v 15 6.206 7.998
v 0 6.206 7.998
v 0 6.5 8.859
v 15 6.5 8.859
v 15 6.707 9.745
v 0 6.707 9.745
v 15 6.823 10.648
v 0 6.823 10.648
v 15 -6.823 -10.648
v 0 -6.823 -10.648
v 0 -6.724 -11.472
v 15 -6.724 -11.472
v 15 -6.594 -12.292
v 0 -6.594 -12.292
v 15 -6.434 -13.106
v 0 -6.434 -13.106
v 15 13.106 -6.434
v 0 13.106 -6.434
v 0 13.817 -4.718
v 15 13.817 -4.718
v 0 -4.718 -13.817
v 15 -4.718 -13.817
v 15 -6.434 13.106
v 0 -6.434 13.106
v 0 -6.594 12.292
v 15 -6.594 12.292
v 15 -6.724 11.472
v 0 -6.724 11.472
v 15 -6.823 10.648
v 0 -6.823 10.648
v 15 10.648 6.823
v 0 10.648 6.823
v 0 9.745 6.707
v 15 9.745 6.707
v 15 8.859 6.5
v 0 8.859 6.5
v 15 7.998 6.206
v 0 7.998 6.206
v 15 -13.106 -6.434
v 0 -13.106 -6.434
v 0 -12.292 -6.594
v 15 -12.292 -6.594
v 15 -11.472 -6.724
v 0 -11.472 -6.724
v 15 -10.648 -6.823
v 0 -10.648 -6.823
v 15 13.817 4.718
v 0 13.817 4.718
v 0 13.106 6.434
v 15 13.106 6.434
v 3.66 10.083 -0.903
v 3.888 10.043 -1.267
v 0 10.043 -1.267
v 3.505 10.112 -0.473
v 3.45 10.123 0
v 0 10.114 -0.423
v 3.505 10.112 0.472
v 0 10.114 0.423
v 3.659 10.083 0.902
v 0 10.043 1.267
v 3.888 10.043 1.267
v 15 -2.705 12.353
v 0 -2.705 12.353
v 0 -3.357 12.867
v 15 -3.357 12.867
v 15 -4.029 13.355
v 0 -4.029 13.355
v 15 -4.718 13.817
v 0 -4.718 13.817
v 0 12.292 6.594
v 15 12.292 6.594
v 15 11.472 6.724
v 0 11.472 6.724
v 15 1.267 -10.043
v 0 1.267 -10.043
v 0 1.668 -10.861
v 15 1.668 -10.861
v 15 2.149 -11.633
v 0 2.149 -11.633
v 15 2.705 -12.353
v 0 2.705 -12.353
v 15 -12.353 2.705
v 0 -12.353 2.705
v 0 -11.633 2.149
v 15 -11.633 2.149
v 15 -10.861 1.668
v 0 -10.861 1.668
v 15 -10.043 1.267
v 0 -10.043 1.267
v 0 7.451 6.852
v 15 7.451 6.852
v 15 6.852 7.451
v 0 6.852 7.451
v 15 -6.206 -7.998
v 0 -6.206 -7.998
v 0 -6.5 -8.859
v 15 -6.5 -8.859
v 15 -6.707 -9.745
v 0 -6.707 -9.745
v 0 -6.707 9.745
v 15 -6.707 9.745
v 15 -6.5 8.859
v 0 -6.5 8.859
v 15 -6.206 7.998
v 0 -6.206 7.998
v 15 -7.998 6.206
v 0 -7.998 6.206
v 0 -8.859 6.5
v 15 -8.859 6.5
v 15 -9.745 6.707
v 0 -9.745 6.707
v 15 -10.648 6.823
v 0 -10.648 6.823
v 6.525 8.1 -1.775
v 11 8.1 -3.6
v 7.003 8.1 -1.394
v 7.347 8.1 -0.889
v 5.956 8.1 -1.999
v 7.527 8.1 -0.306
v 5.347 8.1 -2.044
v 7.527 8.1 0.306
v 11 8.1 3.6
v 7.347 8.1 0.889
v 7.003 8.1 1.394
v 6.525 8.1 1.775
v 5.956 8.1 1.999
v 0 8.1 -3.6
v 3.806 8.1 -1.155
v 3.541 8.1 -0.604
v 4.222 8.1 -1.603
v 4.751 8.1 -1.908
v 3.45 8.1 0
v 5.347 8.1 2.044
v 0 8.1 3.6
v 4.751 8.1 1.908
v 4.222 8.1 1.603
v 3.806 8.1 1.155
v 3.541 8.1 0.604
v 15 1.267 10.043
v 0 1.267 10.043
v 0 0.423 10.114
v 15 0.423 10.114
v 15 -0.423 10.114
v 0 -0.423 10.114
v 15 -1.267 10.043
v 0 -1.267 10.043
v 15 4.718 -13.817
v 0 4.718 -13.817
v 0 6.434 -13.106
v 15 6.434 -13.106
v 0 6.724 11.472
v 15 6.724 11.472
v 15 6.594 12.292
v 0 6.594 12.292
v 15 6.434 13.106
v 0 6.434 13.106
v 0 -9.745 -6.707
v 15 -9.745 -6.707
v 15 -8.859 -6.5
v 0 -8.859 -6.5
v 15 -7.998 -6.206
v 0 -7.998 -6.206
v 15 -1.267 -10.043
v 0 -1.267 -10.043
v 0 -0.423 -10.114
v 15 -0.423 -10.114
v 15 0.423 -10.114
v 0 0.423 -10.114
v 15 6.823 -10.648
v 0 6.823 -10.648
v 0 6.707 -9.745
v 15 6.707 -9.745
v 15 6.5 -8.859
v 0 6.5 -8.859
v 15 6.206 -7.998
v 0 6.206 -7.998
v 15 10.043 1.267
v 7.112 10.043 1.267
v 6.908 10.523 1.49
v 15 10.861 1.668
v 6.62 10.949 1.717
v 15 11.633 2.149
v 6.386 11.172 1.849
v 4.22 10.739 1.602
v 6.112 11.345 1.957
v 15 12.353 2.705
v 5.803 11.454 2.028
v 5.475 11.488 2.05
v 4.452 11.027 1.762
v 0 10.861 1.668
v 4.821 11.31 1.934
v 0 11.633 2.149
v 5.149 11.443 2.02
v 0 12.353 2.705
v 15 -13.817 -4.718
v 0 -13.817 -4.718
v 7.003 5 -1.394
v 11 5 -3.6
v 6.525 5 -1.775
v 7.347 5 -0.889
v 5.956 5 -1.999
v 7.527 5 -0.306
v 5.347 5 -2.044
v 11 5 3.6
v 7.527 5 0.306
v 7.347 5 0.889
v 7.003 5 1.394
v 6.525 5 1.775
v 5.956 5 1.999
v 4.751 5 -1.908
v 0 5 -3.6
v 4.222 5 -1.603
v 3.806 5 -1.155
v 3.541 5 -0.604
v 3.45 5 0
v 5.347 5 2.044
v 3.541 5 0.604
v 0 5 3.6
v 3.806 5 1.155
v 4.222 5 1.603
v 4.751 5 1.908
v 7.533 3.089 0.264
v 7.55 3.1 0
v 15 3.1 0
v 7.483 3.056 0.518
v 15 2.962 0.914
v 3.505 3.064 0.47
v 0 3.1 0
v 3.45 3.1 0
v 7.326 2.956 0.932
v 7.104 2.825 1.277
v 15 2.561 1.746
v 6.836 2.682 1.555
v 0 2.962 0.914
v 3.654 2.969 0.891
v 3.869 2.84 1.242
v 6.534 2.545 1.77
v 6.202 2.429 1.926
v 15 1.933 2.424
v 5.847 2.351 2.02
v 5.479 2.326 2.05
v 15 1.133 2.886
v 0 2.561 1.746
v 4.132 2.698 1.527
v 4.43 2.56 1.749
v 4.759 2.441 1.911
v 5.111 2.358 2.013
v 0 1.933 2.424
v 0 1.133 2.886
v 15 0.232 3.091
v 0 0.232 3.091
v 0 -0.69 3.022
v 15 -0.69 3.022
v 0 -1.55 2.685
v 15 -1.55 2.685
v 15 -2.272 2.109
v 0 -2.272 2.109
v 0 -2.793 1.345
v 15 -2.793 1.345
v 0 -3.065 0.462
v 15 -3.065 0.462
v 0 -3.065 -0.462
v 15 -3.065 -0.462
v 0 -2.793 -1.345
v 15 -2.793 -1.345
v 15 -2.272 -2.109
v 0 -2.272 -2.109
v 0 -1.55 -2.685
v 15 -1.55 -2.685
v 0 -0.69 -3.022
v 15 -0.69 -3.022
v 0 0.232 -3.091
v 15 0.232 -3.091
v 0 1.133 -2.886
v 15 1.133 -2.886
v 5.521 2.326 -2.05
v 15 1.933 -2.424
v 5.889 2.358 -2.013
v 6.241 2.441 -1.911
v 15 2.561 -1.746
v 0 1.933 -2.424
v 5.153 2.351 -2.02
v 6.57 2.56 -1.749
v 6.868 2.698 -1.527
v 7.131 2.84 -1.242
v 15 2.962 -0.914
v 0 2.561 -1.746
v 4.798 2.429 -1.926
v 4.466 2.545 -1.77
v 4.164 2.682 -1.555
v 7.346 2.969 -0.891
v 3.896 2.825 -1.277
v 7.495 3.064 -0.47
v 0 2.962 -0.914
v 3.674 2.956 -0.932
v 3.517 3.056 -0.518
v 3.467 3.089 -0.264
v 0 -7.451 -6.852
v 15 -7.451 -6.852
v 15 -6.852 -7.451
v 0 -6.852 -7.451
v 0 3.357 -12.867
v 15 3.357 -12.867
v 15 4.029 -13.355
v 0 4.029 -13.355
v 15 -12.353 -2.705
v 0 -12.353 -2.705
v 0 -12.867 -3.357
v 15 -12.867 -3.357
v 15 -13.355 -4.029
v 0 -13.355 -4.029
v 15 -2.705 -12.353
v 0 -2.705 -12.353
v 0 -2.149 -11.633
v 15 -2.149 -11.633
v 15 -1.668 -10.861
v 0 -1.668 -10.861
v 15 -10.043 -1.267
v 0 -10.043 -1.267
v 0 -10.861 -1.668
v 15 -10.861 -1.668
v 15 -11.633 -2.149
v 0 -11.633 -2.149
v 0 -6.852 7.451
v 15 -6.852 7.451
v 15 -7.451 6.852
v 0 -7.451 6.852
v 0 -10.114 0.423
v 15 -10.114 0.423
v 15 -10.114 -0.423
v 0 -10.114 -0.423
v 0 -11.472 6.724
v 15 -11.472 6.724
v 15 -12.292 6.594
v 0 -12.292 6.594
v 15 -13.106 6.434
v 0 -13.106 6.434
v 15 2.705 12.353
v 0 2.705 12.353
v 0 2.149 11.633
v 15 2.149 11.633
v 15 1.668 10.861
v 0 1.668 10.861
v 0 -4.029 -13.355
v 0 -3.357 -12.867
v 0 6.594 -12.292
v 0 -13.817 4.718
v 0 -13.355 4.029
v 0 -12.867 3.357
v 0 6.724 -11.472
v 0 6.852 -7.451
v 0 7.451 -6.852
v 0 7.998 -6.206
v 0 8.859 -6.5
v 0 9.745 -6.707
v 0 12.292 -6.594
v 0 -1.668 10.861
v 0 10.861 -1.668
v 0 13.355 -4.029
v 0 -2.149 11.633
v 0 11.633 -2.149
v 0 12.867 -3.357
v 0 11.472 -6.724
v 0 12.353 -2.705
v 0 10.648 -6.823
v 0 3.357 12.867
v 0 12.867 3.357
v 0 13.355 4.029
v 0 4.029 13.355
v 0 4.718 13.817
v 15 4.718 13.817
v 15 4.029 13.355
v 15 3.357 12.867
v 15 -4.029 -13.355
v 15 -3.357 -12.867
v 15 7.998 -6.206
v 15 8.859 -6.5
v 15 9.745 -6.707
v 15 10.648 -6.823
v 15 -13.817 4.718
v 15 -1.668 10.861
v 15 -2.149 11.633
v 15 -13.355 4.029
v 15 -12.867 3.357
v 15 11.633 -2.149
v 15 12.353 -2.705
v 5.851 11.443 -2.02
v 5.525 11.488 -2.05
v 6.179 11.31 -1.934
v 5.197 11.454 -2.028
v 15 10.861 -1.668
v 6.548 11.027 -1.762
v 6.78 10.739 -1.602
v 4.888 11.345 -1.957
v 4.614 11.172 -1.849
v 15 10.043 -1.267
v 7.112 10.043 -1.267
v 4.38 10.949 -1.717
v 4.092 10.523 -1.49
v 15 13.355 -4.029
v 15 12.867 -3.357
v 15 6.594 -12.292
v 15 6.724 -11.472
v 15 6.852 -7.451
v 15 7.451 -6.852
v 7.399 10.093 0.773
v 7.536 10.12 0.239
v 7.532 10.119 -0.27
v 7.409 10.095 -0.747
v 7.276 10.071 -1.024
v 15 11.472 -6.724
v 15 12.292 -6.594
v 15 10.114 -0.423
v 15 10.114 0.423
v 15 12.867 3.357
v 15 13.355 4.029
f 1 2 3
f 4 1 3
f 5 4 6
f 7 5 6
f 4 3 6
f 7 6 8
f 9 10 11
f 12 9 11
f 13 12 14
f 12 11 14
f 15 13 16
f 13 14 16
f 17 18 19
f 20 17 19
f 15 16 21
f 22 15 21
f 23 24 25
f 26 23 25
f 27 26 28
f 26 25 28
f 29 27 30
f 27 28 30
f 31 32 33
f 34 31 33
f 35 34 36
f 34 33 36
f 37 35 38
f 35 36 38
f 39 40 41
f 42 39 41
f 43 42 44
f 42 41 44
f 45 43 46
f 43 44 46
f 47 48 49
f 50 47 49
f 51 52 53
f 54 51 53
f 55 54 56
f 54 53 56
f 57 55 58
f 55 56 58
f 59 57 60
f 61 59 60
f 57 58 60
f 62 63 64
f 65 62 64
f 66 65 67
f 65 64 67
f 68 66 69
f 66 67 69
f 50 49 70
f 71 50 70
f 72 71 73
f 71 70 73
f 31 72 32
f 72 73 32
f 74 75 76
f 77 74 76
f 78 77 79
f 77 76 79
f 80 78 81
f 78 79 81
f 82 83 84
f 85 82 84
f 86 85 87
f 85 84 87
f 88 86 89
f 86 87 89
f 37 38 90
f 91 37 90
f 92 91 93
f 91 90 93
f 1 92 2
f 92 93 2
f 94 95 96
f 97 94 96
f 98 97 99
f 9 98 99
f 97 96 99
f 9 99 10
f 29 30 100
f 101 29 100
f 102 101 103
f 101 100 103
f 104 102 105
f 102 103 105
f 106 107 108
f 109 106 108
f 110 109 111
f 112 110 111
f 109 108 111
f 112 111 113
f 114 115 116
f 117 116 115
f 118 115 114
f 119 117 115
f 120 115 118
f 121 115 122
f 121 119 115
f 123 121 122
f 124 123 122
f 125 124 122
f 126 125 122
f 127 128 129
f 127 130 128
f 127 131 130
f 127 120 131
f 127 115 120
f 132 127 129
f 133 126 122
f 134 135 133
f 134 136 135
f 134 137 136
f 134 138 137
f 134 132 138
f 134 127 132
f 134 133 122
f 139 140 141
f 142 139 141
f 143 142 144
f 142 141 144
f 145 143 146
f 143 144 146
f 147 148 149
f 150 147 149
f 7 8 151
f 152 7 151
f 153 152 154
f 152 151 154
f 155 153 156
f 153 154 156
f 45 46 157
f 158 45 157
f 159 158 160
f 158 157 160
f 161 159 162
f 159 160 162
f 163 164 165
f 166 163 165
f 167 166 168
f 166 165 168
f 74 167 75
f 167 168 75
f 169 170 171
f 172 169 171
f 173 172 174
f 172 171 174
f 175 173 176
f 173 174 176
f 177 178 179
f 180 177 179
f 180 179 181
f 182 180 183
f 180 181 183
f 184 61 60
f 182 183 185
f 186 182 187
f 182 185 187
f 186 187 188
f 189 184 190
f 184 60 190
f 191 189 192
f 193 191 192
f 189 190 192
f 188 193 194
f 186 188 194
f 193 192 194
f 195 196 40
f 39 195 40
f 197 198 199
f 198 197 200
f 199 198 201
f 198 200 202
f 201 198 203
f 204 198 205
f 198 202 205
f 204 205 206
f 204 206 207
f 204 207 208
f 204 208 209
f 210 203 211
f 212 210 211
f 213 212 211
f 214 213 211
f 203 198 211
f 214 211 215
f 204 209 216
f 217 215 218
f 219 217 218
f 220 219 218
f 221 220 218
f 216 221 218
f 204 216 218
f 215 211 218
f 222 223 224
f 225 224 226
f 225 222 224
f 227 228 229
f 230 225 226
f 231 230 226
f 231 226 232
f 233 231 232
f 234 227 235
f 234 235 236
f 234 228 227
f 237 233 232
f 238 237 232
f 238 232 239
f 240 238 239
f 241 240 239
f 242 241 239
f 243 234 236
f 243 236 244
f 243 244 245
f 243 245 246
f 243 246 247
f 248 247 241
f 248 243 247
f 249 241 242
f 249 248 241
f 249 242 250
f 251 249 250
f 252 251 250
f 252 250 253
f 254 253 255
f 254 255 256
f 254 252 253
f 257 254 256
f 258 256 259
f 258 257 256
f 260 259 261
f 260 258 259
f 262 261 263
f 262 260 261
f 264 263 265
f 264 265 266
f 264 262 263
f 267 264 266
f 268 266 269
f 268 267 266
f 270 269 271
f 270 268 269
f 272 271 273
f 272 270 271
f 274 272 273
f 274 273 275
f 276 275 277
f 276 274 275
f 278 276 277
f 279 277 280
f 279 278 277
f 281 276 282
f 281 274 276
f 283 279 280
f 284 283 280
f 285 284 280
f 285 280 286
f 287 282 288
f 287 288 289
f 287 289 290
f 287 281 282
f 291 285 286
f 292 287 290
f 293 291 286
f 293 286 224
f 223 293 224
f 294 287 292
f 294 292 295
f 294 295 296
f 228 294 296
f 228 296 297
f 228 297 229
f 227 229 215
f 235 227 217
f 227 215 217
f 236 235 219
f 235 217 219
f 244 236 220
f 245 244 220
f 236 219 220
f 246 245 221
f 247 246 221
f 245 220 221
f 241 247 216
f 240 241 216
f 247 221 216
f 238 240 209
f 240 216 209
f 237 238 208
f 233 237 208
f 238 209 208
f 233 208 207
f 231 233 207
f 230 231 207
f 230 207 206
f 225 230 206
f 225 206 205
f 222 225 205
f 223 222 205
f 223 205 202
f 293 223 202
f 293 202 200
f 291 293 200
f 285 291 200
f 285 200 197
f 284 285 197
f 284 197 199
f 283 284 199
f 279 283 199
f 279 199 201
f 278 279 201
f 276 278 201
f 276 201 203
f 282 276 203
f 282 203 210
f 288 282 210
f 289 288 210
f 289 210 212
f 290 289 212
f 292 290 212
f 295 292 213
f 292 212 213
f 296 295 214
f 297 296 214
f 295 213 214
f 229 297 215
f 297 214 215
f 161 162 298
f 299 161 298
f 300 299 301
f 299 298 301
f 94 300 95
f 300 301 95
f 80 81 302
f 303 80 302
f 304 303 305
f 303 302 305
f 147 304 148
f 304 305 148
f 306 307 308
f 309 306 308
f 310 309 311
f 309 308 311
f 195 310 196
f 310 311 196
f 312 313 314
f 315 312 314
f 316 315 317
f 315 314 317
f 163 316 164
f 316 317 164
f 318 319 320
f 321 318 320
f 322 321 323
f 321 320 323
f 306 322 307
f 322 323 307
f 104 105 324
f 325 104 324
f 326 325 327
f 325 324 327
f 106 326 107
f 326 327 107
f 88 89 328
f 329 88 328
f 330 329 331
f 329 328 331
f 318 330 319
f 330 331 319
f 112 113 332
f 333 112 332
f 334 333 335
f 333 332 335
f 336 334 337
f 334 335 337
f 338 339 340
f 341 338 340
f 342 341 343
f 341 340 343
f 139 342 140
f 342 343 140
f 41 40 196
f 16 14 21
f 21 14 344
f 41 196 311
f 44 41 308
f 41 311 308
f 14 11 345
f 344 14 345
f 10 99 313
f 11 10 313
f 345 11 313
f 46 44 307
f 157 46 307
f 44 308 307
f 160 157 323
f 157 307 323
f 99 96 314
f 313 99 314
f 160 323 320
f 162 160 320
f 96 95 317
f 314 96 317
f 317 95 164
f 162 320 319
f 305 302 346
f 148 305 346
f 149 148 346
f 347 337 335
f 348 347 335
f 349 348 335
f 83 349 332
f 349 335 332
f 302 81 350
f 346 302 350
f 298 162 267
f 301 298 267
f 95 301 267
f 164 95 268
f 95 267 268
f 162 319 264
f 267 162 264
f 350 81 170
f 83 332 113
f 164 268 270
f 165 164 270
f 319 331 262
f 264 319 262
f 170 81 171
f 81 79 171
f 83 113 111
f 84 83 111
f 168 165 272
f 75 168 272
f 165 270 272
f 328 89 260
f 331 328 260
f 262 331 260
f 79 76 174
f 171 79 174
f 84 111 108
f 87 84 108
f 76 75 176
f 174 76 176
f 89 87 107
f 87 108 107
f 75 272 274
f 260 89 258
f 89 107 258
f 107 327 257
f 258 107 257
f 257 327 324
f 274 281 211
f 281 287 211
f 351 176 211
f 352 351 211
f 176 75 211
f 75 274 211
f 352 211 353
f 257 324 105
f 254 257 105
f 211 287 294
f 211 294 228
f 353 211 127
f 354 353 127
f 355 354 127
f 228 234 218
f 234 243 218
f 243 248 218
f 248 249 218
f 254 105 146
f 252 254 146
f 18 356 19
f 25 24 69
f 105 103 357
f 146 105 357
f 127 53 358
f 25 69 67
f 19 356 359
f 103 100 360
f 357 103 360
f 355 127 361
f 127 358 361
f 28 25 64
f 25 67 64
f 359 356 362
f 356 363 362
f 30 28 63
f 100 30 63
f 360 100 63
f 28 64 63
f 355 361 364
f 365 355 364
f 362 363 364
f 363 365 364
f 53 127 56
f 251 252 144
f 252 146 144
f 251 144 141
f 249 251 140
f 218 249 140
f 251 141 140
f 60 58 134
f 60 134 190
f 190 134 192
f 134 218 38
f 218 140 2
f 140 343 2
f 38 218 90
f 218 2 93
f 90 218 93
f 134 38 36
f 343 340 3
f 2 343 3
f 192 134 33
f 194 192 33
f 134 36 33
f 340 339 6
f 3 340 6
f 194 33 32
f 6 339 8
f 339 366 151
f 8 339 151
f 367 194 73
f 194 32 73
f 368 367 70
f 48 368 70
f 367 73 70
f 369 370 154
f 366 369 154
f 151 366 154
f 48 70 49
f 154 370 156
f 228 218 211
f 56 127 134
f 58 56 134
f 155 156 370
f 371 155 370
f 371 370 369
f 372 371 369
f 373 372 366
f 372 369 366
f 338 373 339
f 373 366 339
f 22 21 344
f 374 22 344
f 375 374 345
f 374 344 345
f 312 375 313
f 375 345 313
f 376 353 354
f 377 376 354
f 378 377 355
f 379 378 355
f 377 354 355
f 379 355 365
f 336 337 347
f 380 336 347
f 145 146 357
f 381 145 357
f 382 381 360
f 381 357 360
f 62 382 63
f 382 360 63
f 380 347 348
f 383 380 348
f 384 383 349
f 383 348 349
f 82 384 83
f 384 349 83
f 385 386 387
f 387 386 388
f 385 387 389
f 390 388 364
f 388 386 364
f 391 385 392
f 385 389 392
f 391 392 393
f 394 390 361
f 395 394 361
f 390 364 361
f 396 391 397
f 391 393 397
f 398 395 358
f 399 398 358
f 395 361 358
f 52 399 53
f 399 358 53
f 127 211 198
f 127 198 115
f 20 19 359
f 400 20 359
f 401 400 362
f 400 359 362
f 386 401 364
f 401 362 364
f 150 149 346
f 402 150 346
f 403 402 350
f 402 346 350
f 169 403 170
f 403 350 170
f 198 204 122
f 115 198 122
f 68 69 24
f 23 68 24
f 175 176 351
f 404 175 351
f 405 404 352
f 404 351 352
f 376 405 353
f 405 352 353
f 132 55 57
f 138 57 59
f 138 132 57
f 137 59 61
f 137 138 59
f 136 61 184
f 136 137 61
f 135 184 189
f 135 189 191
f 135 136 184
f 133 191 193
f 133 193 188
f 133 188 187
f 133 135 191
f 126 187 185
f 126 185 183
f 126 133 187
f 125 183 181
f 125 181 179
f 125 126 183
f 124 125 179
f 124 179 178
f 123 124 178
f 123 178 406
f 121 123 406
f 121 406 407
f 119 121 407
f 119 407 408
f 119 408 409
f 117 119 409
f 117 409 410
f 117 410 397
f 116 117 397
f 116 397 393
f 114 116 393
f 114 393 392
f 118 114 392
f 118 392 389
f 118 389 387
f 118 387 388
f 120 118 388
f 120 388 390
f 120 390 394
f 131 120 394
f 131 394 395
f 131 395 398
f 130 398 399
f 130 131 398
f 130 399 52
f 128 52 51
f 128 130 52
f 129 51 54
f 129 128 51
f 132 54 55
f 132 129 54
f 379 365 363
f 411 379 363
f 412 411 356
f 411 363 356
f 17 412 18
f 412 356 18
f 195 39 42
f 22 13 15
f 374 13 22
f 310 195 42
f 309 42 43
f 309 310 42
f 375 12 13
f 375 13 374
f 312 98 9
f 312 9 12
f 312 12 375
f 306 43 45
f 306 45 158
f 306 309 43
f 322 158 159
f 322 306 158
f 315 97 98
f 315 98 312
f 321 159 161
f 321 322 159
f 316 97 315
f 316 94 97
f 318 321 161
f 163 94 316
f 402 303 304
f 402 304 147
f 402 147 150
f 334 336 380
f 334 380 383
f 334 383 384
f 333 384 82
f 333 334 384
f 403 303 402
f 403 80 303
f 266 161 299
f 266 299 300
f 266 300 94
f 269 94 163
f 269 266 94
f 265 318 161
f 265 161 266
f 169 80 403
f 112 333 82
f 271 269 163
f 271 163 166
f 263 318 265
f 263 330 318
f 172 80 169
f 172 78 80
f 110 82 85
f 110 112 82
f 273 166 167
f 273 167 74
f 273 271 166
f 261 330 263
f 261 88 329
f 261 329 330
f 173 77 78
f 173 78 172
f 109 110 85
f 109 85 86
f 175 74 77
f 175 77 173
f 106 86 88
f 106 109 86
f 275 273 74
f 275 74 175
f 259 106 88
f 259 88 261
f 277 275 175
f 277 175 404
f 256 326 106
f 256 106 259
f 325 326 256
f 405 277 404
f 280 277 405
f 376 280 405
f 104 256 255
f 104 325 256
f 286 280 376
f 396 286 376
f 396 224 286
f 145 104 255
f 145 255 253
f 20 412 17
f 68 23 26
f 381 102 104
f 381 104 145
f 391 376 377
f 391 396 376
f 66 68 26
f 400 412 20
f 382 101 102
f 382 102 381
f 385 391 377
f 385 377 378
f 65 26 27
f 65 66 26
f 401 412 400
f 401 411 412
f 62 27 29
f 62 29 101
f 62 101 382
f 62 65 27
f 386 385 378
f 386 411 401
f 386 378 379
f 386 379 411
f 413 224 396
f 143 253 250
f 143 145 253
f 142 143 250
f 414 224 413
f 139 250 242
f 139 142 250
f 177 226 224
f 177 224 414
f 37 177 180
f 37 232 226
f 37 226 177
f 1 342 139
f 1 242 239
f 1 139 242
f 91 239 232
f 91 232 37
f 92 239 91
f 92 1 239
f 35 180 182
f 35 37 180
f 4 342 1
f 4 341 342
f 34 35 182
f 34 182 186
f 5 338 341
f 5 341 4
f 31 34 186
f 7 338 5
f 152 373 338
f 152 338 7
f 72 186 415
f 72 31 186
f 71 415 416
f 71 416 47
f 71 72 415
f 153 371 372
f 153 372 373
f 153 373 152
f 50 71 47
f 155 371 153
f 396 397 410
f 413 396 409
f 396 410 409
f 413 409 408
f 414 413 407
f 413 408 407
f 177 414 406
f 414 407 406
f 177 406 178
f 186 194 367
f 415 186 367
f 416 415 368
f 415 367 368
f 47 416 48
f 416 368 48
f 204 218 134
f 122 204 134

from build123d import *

# Parameters (mm, degrees)
F0_R     = 3.1
F0_W     = 3.1
F0_H     = 7.2
F1_DEPTH = 15
F2_DEPTH = 11
F3_R     = 2.05
F4_DEPTH = 5
F5_DEPTH = 25


with BuildPart() as f1:
    # F0 (on Right) → F1 (new body)
    with BuildSketch(Plane.YZ):
        with BuildLine():
            ThreePointArc((2.704842, 12.353416), (1.898315, 11.252912), (1.266883, 10.043413))
            ThreePointArc((1.266883, 10.043413), (0, 10.123), (-1.266883, 10.043413))
            ThreePointArc((-1.266883, 10.043413), (-1.898315, 11.252912), (-2.704842, 12.353416))
            ThreePointArc((-2.704842, 12.353416), (-3.690651, 13.113822), (-4.718141, 13.816887))
            Line((-4.718141, 13.816887), (-6.433785, 13.106244))
            ThreePointArc((-6.433785, 13.106244), (-6.663188, 11.882557), (-6.822573, 10.647796))
            ThreePointArc((-6.822573, 10.647796), (-6.614699, 9.299322), (-6.205943, 7.997587))
            ThreePointArc((-6.205943, 7.997587), (-7.158042, 7.158042), (-7.997587, 6.205943))
            ThreePointArc((-7.997587, 6.205943), (-9.299322, 6.614699), (-10.647796, 6.822573))
            ThreePointArc((-10.647796, 6.822573), (-11.882557, 6.663188), (-13.106244, 6.433785))
            Line((-13.106244, 6.433785), (-13.816887, 4.718141))
            ThreePointArc((-13.816887, 4.718141), (-13.113822, 3.690651), (-12.353416, 2.704842))
            ThreePointArc((-12.353416, 2.704842), (-11.252912, 1.898315), (-10.043413, 1.266883))
            ThreePointArc((-10.043413, 1.266883), (-10.123, 0), (-10.043413, -1.266883))
            ThreePointArc((-10.043413, -1.266883), (-11.252912, -1.898315), (-12.353416, -2.704842))
            ThreePointArc((-12.353416, -2.704842), (-13.113822, -3.690651), (-13.816887, -4.718141))
            Line((-13.816887, -4.718141), (-13.106244, -6.433785))
            ThreePointArc((-13.106244, -6.433785), (-11.882557, -6.663188), (-10.647796, -6.822573))
            ThreePointArc((-10.647796, -6.822573), (-9.299322, -6.614699), (-7.997587, -6.205943))
            ThreePointArc((-7.997587, -6.205943), (-7.158042, -7.158042), (-6.205943, -7.997587))
            ThreePointArc((-6.205943, -7.997587), (-6.614699, -9.299322), (-6.822573, -10.647796))
            ThreePointArc((-6.822573, -10.647796), (-6.663188, -11.882557), (-6.433785, -13.106244))
            Line((-6.433785, -13.106244), (-4.718141, -13.816887))
            ThreePointArc((-4.718141, -13.816887), (-3.690651, -13.113822), (-2.704842, -12.353416))
            ThreePointArc((-2.704842, -12.353416), (-1.898315, -11.252912), (-1.266883, -10.043413))
            ThreePointArc((-1.266883, -10.043413), (0, -10.123), (1.266883, -10.043413))
            ThreePointArc((1.266883, -10.043413), (1.898315, -11.252912), (2.704842, -12.353416))
            ThreePointArc((2.704842, -12.353416), (3.690651, -13.113822), (4.718141, -13.816887))
            Line((4.718141, -13.816887), (6.433785, -13.106244))
            ThreePointArc((6.433785, -13.106244), (6.663188, -11.882557), (6.822573, -10.647796))
            ThreePointArc((6.822573, -10.647796), (6.614699, -9.299322), (6.205943, -7.997587))
            ThreePointArc((6.205943, -7.997587), (7.158042, -7.158042), (7.997587, -6.205943))
            ThreePointArc((7.997587, -6.205943), (9.299322, -6.614699), (10.647796, -6.822573))
            ThreePointArc((10.647796, -6.822573), (11.882557, -6.663188), (13.106244, -6.433785))
            Line((13.106244, -6.433785), (13.816887, -4.718141))
            ThreePointArc((13.816887, -4.718141), (13.113822, -3.690651), (12.353416, -2.704842))
            ThreePointArc((12.353416, -2.704842), (11.252912, -1.898315), (10.043413, -1.266883))
            ThreePointArc((10.043413, -1.266883), (10.123, 0), (10.043413, 1.266883))
            ThreePointArc((10.043413, 1.266883), (11.252912, 1.898315), (12.353416, 2.704842))
            ThreePointArc((12.353416, 2.704842), (13.113822, 3.690651), (13.816887, 4.718141))
            Line((13.816887, 4.718141), (13.106244, 6.433785))
            ThreePointArc((13.106244, 6.433785), (11.882557, 6.663188), (10.647796, 6.822573))
            ThreePointArc((10.647796, 6.822573), (9.299322, 6.614699), (7.997587, 6.205943))
            ThreePointArc((7.997587, 6.205943), (7.158042, 7.158042), (6.205943, 7.997587))
            ThreePointArc((6.205943, 7.997587), (6.614699, 9.299322), (6.822573, 10.647796))
            ThreePointArc((6.822573, 10.647796), (6.663188, 11.882557), (6.433785, 13.106244))
            Line((6.433785, 13.106244), (4.718141, 13.816887))
            ThreePointArc((4.718141, 13.816887), (3.690651, 13.113822), (2.704842, 12.353416))
        make_face()
        Circle(F0_R, mode=Mode.SUBTRACT)
        with Locations((6.55, 0)):
            Rectangle(F0_W, F0_H, mode=Mode.SUBTRACT)
        with Locations((6.55, 0)):
            Rectangle(F0_W, F0_H)
    extrude(amount=F1_DEPTH)

    # F0 (on Right) → F2 (cut)
    with BuildSketch(Plane.YZ):
        with Locations((6.55, 0)):
            Rectangle(F0_W, F0_H)
    extrude(amount=F2_DEPTH, mode=Mode.SUBTRACT)

    # F3 (on face) → F4 (cut)
    with BuildSketch(Plane(origin=(0, 5, 0), x_dir=(-1, 0, 0), z_dir=(0, 1, 0))):
        with Locations((-5.5, 0)):
            Circle(F3_R)
    extrude(amount=-F4_DEPTH, mode=Mode.SUBTRACT)

    # F3 (on face) → F5 (cut)
    with BuildSketch(Plane(origin=(0, 5, 0), x_dir=(-1, 0, 0), z_dir=(0, 1, 0))):
        with Locations((-5.5, 0)):
            Circle(F3_R)
    extrude(amount=F5_DEPTH, mode=Mode.SUBTRACT)


solid = f1.part
